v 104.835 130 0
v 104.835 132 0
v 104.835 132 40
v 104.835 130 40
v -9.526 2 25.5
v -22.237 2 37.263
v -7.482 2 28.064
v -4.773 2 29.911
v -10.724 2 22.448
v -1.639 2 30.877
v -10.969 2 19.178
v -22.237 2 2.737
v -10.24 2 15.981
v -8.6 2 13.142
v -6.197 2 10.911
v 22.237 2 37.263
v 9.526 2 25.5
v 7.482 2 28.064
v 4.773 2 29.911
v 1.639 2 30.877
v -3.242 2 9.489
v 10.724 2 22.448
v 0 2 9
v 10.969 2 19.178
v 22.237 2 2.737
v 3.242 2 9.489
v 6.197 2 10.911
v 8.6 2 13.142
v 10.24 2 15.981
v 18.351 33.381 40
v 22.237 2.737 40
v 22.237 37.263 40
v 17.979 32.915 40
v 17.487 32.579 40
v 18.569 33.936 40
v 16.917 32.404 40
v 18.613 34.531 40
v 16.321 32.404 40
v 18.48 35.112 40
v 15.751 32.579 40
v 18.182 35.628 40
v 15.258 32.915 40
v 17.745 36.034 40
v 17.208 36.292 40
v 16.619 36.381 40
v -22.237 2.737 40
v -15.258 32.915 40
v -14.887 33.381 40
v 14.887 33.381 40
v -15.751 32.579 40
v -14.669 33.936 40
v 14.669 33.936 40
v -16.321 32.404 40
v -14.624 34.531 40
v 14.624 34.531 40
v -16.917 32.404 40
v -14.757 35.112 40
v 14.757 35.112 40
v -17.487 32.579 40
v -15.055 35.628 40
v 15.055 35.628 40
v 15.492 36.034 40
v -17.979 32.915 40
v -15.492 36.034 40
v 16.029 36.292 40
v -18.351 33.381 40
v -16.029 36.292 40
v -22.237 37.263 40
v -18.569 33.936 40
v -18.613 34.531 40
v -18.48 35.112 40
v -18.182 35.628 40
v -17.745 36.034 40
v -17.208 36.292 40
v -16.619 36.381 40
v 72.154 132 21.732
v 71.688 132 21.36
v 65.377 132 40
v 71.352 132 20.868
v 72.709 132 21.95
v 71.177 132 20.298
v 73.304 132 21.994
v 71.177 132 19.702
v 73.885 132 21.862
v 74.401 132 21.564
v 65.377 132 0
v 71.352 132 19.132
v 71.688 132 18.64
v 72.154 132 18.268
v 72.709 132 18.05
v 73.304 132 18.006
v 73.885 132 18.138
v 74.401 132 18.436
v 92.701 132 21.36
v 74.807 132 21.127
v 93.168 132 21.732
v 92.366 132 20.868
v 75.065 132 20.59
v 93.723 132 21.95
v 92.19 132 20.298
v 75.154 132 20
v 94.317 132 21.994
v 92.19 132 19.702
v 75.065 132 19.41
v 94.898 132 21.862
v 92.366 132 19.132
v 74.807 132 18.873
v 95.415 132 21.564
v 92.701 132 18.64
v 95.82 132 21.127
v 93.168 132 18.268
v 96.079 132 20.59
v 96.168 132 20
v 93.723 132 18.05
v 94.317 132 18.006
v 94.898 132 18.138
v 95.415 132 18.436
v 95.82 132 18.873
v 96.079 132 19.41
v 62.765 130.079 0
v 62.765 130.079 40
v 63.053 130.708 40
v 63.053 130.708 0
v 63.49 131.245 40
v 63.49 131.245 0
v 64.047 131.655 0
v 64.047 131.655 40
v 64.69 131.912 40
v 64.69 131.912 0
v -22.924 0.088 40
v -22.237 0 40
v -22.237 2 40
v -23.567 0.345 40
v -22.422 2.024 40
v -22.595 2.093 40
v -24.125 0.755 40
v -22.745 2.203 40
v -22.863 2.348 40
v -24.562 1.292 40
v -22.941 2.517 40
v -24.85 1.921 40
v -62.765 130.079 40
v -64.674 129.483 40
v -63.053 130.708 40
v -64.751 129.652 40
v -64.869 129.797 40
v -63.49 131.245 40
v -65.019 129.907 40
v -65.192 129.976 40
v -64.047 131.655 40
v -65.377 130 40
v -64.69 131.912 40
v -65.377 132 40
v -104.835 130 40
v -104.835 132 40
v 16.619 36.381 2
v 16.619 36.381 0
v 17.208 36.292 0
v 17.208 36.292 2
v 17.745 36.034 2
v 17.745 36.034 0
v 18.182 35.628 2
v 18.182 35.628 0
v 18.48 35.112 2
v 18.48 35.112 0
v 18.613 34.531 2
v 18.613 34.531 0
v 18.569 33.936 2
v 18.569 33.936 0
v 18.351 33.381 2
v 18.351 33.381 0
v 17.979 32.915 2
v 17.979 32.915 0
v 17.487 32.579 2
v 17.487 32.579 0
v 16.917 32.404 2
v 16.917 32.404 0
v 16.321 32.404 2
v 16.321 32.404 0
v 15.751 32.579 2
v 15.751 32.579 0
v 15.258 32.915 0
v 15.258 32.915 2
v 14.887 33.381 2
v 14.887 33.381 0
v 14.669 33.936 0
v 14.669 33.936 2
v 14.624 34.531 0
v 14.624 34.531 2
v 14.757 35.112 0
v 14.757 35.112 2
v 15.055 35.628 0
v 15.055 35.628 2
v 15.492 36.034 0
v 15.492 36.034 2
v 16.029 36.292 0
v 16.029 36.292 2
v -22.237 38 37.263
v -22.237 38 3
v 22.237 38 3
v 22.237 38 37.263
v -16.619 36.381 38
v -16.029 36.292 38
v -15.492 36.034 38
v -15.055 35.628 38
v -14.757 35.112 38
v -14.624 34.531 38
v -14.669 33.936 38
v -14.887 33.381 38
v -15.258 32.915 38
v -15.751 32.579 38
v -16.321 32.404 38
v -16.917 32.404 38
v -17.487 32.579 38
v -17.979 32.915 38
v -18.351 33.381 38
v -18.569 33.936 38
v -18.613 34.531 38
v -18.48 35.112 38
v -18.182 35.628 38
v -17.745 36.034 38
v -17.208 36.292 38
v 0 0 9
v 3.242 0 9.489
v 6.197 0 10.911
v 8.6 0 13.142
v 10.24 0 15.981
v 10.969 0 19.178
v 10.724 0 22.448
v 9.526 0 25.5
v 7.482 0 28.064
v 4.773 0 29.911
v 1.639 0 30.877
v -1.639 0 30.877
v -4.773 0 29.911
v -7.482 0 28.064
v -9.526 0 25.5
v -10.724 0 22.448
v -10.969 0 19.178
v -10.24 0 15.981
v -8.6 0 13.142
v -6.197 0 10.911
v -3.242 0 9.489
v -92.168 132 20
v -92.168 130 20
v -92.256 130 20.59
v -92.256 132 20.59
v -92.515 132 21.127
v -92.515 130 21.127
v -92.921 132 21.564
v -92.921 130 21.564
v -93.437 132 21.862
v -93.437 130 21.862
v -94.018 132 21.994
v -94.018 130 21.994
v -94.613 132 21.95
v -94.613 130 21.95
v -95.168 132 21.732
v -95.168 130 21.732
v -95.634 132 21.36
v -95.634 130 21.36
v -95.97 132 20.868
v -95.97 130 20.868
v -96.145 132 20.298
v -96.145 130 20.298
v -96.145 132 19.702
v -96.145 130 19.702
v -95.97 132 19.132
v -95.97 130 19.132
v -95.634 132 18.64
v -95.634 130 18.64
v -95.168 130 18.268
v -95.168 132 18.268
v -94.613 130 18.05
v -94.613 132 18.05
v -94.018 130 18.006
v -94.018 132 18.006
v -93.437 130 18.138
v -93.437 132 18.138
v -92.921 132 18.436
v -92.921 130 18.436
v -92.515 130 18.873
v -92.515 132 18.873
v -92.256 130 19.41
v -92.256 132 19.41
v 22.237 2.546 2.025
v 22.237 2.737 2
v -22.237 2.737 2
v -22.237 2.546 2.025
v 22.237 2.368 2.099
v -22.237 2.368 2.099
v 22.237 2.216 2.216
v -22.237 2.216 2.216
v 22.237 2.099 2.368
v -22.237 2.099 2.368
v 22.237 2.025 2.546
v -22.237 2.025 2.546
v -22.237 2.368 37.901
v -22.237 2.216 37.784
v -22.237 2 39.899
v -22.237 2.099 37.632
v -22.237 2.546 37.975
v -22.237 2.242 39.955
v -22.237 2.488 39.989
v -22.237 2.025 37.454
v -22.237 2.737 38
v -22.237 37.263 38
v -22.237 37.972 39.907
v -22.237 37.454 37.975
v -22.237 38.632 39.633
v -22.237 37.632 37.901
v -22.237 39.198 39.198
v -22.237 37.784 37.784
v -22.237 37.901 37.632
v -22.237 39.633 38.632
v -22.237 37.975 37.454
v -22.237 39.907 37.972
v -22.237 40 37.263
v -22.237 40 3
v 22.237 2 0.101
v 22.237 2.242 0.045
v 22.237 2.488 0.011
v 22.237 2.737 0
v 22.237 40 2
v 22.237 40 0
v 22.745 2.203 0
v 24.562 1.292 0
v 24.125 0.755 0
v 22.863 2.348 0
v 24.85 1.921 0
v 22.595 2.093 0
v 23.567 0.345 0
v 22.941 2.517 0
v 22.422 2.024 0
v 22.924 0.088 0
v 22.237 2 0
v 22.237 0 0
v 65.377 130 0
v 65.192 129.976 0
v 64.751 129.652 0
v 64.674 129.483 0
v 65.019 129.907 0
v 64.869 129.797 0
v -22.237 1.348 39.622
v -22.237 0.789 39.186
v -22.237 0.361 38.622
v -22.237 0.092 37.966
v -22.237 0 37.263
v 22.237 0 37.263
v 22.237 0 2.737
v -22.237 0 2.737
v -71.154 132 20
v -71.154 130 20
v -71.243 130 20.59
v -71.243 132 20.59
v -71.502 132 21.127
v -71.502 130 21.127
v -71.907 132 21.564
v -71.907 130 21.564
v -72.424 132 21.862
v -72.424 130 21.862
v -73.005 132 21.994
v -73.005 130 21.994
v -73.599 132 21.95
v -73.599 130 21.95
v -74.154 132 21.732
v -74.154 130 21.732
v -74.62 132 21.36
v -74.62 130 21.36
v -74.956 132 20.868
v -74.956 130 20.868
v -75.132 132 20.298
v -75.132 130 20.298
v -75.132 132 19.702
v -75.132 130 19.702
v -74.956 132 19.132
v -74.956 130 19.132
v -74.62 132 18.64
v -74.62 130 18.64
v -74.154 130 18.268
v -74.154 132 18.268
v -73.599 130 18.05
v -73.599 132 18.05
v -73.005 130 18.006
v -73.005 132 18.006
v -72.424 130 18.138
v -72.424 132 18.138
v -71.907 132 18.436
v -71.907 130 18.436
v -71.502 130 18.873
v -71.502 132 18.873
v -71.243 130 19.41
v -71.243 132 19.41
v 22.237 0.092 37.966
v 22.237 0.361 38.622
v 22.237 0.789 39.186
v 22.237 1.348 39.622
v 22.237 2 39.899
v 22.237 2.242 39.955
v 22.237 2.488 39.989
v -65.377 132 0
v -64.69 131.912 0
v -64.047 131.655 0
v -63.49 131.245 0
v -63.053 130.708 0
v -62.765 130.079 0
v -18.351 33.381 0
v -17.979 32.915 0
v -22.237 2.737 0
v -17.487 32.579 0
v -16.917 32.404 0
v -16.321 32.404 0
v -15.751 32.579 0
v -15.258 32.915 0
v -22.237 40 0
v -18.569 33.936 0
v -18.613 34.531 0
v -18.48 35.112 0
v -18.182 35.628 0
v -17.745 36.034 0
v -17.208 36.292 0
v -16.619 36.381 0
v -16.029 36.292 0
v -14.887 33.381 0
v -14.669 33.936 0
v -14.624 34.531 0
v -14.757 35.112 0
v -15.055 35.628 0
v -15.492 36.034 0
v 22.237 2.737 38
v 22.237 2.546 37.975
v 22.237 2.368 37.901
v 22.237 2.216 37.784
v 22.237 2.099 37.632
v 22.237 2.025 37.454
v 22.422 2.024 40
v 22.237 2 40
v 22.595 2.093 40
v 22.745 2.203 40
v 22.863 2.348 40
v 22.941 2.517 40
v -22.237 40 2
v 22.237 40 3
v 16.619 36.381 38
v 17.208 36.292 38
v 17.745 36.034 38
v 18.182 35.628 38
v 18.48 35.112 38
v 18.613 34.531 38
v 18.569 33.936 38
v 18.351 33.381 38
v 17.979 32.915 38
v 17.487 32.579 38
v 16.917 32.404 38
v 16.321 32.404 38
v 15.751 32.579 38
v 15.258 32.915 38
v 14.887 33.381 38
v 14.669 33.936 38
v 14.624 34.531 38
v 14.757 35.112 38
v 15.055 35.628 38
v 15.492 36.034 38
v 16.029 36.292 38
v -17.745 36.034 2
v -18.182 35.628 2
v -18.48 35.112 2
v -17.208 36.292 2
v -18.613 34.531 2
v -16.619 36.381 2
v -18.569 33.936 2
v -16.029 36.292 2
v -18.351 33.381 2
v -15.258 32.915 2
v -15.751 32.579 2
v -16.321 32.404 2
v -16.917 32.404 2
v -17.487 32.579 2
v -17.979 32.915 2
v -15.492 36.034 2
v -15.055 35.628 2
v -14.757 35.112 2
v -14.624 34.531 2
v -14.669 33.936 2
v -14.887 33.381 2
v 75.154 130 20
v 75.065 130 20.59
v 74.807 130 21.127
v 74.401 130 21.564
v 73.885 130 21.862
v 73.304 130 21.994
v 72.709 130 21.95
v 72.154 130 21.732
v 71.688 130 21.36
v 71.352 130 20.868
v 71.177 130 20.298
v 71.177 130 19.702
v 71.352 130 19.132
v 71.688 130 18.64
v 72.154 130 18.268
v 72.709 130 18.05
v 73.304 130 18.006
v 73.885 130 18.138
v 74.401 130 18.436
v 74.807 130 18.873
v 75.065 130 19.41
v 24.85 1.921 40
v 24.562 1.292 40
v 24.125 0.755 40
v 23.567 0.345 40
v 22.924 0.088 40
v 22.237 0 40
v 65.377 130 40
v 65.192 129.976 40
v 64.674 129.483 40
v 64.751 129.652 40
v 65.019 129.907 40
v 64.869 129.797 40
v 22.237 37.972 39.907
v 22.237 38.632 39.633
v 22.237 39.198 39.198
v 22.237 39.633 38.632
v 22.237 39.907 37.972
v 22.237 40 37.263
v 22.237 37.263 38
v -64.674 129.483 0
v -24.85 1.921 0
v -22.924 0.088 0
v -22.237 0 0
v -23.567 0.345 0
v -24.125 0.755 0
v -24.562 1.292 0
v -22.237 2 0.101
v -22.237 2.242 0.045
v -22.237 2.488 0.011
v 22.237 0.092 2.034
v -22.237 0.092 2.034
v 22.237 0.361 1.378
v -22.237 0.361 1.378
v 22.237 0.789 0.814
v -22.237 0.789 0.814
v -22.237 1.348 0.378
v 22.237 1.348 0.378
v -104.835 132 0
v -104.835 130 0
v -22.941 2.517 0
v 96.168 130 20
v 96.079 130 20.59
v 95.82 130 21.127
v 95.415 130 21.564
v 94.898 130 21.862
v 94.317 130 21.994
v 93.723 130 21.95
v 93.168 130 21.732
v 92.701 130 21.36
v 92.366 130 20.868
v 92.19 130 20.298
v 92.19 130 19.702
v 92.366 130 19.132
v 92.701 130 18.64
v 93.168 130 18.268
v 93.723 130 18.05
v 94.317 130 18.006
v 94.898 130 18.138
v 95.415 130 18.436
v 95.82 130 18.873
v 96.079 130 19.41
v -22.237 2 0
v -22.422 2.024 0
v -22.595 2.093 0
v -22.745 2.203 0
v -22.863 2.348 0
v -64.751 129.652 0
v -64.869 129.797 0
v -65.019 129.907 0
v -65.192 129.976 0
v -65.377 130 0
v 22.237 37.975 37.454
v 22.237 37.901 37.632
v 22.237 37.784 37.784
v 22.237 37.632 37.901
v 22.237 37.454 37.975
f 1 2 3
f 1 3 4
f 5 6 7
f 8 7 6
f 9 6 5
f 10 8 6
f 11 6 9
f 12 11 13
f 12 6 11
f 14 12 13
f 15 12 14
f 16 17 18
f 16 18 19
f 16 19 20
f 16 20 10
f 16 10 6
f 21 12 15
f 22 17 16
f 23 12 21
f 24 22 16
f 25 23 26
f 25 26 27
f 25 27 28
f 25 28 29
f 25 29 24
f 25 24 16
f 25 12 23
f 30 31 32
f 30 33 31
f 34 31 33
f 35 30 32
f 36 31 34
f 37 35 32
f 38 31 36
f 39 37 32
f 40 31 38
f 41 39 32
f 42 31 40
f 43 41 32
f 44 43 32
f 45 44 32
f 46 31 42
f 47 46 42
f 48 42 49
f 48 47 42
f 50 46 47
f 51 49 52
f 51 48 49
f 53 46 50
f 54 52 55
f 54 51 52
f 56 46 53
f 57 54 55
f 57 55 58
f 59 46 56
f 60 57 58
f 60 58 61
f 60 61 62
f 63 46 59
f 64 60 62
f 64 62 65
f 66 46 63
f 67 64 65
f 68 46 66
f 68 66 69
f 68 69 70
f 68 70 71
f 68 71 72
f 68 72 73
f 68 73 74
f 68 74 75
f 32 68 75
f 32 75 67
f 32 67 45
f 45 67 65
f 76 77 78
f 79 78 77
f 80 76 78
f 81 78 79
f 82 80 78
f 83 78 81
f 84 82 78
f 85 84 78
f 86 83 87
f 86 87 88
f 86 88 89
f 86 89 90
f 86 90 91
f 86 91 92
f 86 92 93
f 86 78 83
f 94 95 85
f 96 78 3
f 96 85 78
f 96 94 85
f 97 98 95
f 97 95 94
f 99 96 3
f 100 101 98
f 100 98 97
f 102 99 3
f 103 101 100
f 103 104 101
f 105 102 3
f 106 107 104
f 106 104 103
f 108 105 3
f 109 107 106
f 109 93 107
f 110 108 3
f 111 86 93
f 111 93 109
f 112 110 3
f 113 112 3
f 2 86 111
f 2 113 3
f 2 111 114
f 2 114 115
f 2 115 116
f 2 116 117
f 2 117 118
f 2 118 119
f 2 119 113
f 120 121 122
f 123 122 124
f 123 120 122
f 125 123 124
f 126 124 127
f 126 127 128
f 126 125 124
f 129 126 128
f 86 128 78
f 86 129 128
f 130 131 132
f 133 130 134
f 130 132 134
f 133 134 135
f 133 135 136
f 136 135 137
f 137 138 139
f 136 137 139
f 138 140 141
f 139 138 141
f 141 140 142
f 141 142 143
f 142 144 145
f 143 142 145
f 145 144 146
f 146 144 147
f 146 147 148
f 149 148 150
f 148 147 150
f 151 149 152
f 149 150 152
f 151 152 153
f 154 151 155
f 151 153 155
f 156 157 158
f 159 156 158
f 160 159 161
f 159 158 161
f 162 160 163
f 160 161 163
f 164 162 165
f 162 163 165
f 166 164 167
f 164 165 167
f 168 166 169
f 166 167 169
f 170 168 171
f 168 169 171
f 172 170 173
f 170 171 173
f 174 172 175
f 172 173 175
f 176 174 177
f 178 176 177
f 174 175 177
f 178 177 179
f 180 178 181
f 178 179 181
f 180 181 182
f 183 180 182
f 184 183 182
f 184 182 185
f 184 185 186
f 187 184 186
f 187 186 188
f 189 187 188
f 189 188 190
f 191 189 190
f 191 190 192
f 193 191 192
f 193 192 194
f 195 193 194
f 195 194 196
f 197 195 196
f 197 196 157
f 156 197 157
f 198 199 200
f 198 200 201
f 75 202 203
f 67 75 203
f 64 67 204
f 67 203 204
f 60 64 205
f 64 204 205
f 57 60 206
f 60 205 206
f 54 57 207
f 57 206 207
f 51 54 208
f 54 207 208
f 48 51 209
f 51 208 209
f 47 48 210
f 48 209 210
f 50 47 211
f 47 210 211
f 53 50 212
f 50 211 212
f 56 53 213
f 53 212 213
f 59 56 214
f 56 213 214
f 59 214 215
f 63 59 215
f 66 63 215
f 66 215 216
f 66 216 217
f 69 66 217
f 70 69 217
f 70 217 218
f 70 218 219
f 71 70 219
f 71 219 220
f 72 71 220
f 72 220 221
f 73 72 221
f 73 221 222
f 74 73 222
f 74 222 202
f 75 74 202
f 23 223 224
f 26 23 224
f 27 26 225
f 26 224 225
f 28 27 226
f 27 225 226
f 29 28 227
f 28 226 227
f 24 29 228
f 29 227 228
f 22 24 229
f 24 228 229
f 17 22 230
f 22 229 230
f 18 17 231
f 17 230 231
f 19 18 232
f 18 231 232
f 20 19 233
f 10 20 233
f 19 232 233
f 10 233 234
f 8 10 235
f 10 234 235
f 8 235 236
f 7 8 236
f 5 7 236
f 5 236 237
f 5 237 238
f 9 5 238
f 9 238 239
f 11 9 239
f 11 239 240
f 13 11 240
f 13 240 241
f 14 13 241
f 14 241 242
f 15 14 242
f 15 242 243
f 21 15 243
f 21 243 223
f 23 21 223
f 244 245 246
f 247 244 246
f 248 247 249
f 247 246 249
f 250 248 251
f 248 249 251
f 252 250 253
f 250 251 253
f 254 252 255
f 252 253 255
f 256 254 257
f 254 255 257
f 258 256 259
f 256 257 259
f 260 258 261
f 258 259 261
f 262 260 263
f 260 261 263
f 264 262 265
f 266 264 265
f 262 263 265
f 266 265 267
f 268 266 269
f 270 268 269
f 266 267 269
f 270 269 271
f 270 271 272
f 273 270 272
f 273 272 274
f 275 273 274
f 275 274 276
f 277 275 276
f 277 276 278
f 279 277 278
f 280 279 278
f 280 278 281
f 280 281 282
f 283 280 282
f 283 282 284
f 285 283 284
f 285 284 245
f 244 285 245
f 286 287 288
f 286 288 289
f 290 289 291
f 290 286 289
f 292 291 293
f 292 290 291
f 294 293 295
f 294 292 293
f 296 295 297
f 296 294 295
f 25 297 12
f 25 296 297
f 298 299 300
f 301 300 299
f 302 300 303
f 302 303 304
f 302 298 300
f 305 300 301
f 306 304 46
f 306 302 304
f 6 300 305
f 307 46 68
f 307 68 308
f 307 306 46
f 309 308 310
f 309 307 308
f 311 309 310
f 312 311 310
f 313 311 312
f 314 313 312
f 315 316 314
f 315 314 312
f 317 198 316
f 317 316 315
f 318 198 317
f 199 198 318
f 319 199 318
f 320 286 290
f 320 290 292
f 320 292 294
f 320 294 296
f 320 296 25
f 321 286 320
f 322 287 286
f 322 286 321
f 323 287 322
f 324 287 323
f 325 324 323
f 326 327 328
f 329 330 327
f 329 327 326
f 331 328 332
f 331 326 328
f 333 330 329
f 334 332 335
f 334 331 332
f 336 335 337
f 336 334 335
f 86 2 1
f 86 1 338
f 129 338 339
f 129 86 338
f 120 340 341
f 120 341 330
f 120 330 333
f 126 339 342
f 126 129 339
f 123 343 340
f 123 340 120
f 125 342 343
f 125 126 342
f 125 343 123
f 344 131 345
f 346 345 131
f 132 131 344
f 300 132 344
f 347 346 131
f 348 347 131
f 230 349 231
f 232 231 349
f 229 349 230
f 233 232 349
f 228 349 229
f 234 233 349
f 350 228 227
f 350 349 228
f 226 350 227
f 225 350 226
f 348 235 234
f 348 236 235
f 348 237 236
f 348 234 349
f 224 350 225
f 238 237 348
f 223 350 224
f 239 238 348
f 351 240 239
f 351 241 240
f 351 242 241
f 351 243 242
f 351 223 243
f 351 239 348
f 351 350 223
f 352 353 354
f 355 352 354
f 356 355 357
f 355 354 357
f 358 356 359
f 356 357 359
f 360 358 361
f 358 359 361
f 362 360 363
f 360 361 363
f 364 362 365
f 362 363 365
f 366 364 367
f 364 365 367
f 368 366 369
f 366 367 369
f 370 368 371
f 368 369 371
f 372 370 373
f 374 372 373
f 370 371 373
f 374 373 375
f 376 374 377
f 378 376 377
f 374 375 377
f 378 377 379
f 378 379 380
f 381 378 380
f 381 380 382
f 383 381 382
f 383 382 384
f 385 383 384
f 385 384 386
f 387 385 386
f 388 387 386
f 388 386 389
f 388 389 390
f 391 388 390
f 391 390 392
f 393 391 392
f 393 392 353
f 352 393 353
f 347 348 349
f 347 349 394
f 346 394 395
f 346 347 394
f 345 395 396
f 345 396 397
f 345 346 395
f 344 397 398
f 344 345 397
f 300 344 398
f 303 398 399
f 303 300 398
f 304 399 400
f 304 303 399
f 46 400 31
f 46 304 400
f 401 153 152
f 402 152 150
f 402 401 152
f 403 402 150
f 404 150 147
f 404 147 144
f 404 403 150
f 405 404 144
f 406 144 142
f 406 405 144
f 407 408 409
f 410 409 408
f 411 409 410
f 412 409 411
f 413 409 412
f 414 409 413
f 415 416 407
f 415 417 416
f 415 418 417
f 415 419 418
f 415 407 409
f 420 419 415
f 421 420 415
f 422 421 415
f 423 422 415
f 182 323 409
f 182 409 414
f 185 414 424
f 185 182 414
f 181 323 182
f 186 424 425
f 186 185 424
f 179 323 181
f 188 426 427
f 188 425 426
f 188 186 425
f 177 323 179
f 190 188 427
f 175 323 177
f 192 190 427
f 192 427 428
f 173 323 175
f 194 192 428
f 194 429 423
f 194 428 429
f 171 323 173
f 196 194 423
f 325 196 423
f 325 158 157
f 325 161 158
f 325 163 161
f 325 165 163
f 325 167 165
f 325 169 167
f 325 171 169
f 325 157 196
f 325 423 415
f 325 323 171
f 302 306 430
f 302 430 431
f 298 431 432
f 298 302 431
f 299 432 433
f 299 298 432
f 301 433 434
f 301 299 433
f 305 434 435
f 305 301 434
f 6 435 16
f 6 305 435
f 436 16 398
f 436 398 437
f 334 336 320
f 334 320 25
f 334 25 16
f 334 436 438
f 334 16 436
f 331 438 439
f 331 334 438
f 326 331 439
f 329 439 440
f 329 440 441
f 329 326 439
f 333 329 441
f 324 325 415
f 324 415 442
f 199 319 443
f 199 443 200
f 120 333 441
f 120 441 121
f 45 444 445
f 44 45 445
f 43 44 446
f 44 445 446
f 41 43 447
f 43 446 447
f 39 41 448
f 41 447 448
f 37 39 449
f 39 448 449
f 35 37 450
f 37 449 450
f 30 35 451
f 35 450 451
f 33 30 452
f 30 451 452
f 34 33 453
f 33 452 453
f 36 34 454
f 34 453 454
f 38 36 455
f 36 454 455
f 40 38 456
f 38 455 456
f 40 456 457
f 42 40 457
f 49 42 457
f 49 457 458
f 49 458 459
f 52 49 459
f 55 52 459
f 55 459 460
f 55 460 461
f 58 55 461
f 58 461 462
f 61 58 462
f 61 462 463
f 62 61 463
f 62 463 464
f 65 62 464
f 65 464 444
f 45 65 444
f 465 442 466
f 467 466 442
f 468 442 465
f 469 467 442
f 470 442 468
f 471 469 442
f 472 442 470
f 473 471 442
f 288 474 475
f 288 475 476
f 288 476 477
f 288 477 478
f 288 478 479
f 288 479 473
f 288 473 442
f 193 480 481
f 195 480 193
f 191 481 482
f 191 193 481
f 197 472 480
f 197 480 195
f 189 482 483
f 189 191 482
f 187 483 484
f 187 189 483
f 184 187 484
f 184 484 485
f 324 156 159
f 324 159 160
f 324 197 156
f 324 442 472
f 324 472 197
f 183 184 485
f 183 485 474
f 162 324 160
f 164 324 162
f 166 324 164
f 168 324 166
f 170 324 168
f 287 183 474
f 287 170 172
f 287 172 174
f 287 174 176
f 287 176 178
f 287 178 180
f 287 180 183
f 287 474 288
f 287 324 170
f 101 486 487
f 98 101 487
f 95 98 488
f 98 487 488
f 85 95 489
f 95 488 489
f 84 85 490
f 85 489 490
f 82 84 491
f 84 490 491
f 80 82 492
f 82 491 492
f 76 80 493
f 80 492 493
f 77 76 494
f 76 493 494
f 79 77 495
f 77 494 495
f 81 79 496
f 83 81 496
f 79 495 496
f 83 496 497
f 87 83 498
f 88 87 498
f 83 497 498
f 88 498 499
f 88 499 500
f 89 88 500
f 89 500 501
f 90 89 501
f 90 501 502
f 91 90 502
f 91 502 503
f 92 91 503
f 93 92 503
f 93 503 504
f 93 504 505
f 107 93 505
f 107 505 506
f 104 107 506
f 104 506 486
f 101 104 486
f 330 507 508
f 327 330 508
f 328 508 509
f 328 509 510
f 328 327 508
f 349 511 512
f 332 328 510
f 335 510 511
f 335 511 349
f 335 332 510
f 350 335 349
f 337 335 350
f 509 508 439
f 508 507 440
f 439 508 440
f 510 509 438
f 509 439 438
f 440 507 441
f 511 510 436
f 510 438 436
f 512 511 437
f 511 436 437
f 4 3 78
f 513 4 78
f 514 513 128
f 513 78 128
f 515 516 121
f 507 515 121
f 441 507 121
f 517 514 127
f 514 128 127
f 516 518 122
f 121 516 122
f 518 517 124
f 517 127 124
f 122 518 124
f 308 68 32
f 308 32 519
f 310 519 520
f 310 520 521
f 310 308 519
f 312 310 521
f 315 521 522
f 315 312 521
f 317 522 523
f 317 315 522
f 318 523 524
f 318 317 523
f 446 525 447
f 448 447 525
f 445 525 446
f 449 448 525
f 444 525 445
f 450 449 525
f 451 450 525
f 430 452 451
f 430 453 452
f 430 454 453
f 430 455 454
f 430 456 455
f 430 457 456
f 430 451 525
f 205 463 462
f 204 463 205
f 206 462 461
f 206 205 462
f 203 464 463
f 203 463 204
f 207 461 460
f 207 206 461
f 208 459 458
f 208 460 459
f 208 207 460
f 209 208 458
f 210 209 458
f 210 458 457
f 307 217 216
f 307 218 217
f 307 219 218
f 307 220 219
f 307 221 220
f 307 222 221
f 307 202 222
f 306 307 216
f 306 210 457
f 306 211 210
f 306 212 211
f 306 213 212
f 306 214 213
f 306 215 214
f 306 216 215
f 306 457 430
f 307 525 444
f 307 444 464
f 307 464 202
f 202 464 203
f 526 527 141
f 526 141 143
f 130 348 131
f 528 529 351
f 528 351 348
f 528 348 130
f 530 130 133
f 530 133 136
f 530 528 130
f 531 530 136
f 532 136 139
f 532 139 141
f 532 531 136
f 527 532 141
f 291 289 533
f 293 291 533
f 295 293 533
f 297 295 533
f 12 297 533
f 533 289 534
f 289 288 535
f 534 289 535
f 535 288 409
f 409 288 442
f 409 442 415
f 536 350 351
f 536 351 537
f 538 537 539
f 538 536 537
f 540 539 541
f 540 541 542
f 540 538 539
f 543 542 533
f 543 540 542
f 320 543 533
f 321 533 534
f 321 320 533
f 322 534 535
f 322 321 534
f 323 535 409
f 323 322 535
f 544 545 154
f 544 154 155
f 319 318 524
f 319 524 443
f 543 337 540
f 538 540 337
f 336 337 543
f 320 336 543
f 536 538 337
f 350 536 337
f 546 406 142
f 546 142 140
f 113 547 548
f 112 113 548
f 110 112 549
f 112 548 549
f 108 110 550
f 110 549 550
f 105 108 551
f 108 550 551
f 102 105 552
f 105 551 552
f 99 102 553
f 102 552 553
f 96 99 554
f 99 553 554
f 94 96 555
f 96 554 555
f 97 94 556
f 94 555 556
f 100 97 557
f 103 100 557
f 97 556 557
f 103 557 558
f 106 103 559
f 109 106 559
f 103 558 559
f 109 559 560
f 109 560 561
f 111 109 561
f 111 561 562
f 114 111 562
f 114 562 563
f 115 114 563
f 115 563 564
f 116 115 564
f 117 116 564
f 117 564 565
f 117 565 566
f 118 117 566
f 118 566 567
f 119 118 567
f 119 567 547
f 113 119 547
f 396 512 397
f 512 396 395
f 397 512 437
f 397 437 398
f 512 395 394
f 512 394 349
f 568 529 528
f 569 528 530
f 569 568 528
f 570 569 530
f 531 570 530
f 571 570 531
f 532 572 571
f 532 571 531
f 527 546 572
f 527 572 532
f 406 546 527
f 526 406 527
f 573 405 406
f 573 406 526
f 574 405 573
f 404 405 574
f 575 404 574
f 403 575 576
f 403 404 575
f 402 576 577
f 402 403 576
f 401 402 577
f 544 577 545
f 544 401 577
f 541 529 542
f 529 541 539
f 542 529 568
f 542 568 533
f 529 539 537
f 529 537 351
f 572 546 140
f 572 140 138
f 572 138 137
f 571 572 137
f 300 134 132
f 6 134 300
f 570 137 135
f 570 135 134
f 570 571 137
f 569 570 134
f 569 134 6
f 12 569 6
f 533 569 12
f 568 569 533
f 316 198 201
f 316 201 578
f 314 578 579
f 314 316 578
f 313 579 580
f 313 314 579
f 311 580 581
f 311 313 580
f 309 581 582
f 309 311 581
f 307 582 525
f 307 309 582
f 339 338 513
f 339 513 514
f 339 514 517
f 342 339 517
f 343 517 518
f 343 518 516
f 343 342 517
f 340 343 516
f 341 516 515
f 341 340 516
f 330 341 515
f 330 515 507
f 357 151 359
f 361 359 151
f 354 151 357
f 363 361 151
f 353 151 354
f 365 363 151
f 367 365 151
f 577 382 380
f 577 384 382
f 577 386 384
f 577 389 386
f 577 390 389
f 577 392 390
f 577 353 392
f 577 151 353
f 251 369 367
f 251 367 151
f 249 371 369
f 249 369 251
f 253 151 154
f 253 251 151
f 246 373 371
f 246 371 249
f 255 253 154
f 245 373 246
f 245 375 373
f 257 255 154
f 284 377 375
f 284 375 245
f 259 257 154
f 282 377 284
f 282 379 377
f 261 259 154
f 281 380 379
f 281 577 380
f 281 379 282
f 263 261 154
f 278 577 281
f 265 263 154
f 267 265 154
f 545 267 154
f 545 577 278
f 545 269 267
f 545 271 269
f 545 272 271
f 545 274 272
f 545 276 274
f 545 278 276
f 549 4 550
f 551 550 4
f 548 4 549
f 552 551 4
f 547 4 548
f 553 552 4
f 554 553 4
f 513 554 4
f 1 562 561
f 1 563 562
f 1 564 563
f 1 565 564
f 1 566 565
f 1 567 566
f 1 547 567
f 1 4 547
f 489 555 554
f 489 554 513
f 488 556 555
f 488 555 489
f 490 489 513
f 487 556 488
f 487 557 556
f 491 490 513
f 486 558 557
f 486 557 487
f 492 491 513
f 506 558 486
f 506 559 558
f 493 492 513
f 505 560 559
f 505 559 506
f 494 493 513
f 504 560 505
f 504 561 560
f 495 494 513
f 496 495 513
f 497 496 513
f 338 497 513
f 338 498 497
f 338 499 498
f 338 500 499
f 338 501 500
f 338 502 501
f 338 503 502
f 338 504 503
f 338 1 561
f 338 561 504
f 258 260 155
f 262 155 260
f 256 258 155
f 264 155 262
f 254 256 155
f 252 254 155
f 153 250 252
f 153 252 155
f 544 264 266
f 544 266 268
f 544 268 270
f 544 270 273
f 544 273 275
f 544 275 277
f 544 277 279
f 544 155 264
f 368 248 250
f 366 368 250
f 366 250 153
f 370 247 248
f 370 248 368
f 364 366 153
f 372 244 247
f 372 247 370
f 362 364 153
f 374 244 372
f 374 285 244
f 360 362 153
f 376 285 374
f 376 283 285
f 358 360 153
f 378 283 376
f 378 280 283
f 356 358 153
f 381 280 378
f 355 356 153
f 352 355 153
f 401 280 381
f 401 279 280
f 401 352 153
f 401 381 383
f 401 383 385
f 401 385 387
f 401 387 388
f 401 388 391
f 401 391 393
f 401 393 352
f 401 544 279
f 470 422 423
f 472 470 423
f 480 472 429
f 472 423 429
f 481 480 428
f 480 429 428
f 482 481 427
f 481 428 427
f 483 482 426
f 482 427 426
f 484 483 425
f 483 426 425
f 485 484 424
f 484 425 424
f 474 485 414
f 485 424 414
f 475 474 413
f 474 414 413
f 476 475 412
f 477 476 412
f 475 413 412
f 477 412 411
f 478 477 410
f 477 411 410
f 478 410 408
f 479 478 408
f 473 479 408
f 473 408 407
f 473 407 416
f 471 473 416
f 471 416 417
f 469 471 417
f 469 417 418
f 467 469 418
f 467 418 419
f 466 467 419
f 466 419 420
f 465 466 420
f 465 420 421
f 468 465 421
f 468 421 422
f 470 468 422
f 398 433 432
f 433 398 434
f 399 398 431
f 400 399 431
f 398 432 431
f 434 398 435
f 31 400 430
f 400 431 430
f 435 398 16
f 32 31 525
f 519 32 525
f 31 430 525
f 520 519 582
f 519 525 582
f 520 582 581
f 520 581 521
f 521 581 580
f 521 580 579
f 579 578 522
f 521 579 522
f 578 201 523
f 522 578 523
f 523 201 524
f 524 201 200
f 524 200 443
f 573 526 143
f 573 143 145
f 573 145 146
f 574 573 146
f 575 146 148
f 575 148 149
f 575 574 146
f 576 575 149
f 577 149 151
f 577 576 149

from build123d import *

# Parameters (mm, degrees)
BASE_FLANGE1_DEPTH           = 40
EDGE_FLANGE1_STRIP_W         = 9.4732
EDGE_FLANGE1_STRIP_H         = 2
EDGE_FLANGE1_STRIP_CUT_DEPTH = 44.47497737
EDGE_FLANGE1_DEPTH           = 44.47497737
EDGE_FLANGE2_STRIP_W         = 9.4732
EDGE_FLANGE2_STRIP_H         = 2
EDGE_FLANGE2_STRIP_CUT_DEPTH = 44.47497737
EDGE_FLANGE2_DEPTH           = 44.47497737
EDGE_FLANGE3_STRIP_W         = 9.4732
EDGE_FLANGE3_STRIP_H         = 2
EDGE_FLANGE3_STRIP_CUT_DEPTH = 44.47497737
EDGE_FLANGE3_DEPTH           = 44.47497737
CUT_EXTRUDE1_REACH           = 175.247
SKETCH28_R                   = 11
SKETCH28_R_2                 = 2
SKETCH29_R                   = 2
CUT_EXTRUDE2_DEPTH           = 174.246707232


# Sheet-metal steps are written as plain solids
with BuildPart() as part:
    # Sketch1 → Base-Flange1 (new body)
    with BuildSketch(Plane.XY):
        with BuildLine():
            Line((104.835211483, 130), (65.376911342, 130))
            ThreePointArc((65.376911342, 130), (64.940513549, 129.856810925), (64.67378015, 129.482913293))
            Line((64.67378015, 129.482913293), (24.849746113, 1.921069076))
            ThreePointArc((24.849746113, 1.921069076), (23.858784098, 0.531972879), (22.237488685, 0))
            Line((22.237488685, 0), (-22.237488685, 0))
            ThreePointArc((-22.237488685, 0), (-23.858784098, 0.531972879), (-24.849746113, 1.921069076))
            Line((-24.849746113, 1.921069076), (-64.67378015, 129.482913293))
            ThreePointArc((-64.67378015, 129.482913293), (-64.940513549, 129.856810925), (-65.376911342, 130))
            Line((-65.376911342, 130), (-104.835211483, 130))
            Line((-104.835211483, 130), (-104.835211483, 132))
            Line((-104.835211483, 132), (-65.376911342, 132))
            ThreePointArc((-65.376911342, 132), (-63.755615929, 131.468027121), (-62.764653914, 130.078930924))
            Line((-62.764653914, 130.078930924), (-22.940619877, 2.517086707))
            ThreePointArc((-22.940619877, 2.517086707), (-22.673886478, 2.143189075), (-22.237488685, 2))
            Line((-22.237488685, 2), (22.237488685, 2))
            ThreePointArc((22.237488685, 2), (22.673886478, 2.143189075), (22.940619877, 2.517086707))
            Line((22.940619877, 2.517086707), (62.764653914, 130.078930924))
            ThreePointArc((62.764653914, 130.078930924), (63.755615929, 131.468027121), (65.376911342, 132))
            Line((65.376911342, 132), (104.835211483, 132))
            Line((104.835211483, 132), (104.835211483, 130))
        make_face()
    extrude(amount=BASE_FLANGE1_DEPTH)

    # Edge-Flange1 strip (across the edge) → Edge-Flange1 strip cut (cut)
    with BuildSketch(Plane(origin=(22.237488685, 2, 0), x_dir=(0, 0, 1), z_dir=(-1, 0, 0))):
        with Locations((-2, -1)):
            Rectangle(EDGE_FLANGE1_STRIP_W, EDGE_FLANGE1_STRIP_H)
    extrude(amount=EDGE_FLANGE1_STRIP_CUT_DEPTH, mode=Mode.SUBTRACT)

    # Edge-Flange1 section (across the edge) → Edge-Flange1 (add)
    with BuildSketch(Plane(origin=(22.237488685, 2, 0), x_dir=(0, 0, 1), z_dir=(-1, 0, 0))):
        with BuildLine():
            Line((0, 0.7366), (0, 38))
            Line((0, 38), (2, 38))
            Line((2, 38), (2, 0.7366))
            ThreePointArc((2, 0.7366), (2.215745145, 0.215745145), (2.7366, 0))
            Line((2.7366, 0), (2.7366, -2))
            ThreePointArc((2.7366, -2), (0.801531583, -1.198468417), (0, 0.7366))
        make_face()
    extrude(amount=EDGE_FLANGE1_DEPTH)

    # Edge-Flange2 strip (across the edge) → Edge-Flange2 strip cut (cut)
    with BuildSketch(Plane(origin=(-22.237488685, 2, 40), x_dir=(0, 0, -1), z_dir=(1, 0, 0))):
        with Locations((-2, -1)):
            Rectangle(EDGE_FLANGE2_STRIP_W, EDGE_FLANGE2_STRIP_H)
    extrude(amount=EDGE_FLANGE2_STRIP_CUT_DEPTH, mode=Mode.SUBTRACT)

    # Edge-Flange2 section (across the edge) → Edge-Flange2 (add)
    with BuildSketch(Plane(origin=(-22.237488685, 2, 40), x_dir=(0, 0, -1), z_dir=(1, 0, 0))):
        with BuildLine():
            Line((0, 0.7366), (0, 38))
            Line((0, 38), (2, 38))
            Line((2, 38), (2, 0.7366))
            ThreePointArc((2, 0.7366), (2.215745145, 0.215745145), (2.7366, 0))
            Line((2.7366, 0), (2.7366, -2))
            ThreePointArc((2.7366, -2), (0.801531583, -1.198468417), (0, 0.7366))
        make_face()
    extrude(amount=EDGE_FLANGE2_DEPTH)

    # Edge-Flange3 strip (across the edge) → Edge-Flange3 strip cut (cut)
    with BuildSketch(Plane(origin=(-22.237488685, 40, 38), x_dir=(0, -1, 0), z_dir=(1, 0, 0))):
        with Locations((-2, -1)):
            Rectangle(EDGE_FLANGE3_STRIP_W, EDGE_FLANGE3_STRIP_H)
    extrude(amount=EDGE_FLANGE3_STRIP_CUT_DEPTH, mode=Mode.SUBTRACT)

    # Edge-Flange3 section (across the edge) → Edge-Flange3 (add)
    with BuildSketch(Plane(origin=(-22.237488685, 40, 38), x_dir=(0, -1, 0), z_dir=(1, 0, 0))):
        with BuildLine():
            Line((0, 0.7366), (0, 35))
            Line((0, 35), (2, 35))
            Line((2, 35), (2, 0.7366))
            ThreePointArc((2, 0.7366), (2.215745145, 0.215745145), (2.7366, 0))
            Line((2.7366, 0), (2.7366, -2))
            ThreePointArc((2.7366, -2), (0.801531583, -1.198468417), (0, 0.7366))
        make_face()
    extrude(amount=EDGE_FLANGE3_DEPTH)

    # Sketch28 → Cut-Extrude1 (cut, up to next)
    with BuildSketch(Plane.XZ, mode=Mode.PRIVATE) as cut_extrude1_sk1:
        with Locations(Location((0, 20, 0), (0, 0, 270))):
            Circle(SKETCH28_R)
    cut_extrude1_tool1 = extrude(cut_extrude1_sk1.sketch, amount=-CUT_EXTRUDE1_REACH, mode=Mode.PRIVATE) & part.part
    # Sketch28 → Cut-Extrude1 (cut, up to next)
    with BuildSketch(Plane.XZ, mode=Mode.PRIVATE) as cut_extrude1_sk2:
        with Locations((73.154329826, 20)):
            Circle(SKETCH28_R_2)
    cut_extrude1_tool2 = extrude(cut_extrude1_sk2.sketch, amount=-CUT_EXTRUDE1_REACH, mode=Mode.PRIVATE) & part.part
    # Sketch28 → Cut-Extrude1 (cut, up to next)
    with BuildSketch(Plane.XZ, mode=Mode.PRIVATE) as cut_extrude1_sk3:
        with Locations((94.167570852, 20)):
            Circle(SKETCH28_R_2)
    cut_extrude1_tool3 = extrude(cut_extrude1_sk3.sketch, amount=-CUT_EXTRUDE1_REACH, mode=Mode.PRIVATE) & part.part
    # Sketch28 → Cut-Extrude1 (cut, up to next)
    with BuildSketch(Plane.XZ, mode=Mode.PRIVATE) as cut_extrude1_sk4:
        with Locations((-94.167570852, 20)):
            Circle(SKETCH28_R_2)
    cut_extrude1_tool4 = extrude(cut_extrude1_sk4.sketch, amount=-CUT_EXTRUDE1_REACH, mode=Mode.PRIVATE) & part.part
    # Sketch28 → Cut-Extrude1 (cut, up to next)
    with BuildSketch(Plane.XZ, mode=Mode.PRIVATE) as cut_extrude1_sk5:
        with Locations((-73.154329826, 20)):
            Circle(SKETCH28_R_2)
    cut_extrude1_tool5 = extrude(cut_extrude1_sk5.sketch, amount=-CUT_EXTRUDE1_REACH, mode=Mode.PRIVATE) & part.part
    add(cut_extrude1_tool1.solids().sort_by_distance((0, 0, 20))[0], mode=Mode.SUBTRACT)
    add(cut_extrude1_tool2.solids().sort_by_distance((73.15433, 0, 20))[0], mode=Mode.SUBTRACT)
    add(cut_extrude1_tool3.solids().sort_by_distance((94.167571, 0, 20))[0], mode=Mode.SUBTRACT)
    add(cut_extrude1_tool4.solids().sort_by_distance((-94.167571, 0, 20))[0], mode=Mode.SUBTRACT)
    add(cut_extrude1_tool5.solids().sort_by_distance((-73.15433, 0, 20))[0], mode=Mode.SUBTRACT)

    # Sketch29 → Cut-Extrude2 (cut, through all)
    with BuildSketch(Plane(origin=(0, 0, 0), x_dir=(-1, 0, 0), z_dir=(0, 0, -1))):
        with Locations(Location((-16.618744342, 34.381255658, 0), (0, 0, 90))):
            Circle(SKETCH29_R)
        with Locations(Location((16.618744342, 34.381255658, 0), (0, 0, 90))):
            Circle(SKETCH29_R)
    extrude(amount=-CUT_EXTRUDE2_DEPTH, mode=Mode.SUBTRACT)


solid = part.part
